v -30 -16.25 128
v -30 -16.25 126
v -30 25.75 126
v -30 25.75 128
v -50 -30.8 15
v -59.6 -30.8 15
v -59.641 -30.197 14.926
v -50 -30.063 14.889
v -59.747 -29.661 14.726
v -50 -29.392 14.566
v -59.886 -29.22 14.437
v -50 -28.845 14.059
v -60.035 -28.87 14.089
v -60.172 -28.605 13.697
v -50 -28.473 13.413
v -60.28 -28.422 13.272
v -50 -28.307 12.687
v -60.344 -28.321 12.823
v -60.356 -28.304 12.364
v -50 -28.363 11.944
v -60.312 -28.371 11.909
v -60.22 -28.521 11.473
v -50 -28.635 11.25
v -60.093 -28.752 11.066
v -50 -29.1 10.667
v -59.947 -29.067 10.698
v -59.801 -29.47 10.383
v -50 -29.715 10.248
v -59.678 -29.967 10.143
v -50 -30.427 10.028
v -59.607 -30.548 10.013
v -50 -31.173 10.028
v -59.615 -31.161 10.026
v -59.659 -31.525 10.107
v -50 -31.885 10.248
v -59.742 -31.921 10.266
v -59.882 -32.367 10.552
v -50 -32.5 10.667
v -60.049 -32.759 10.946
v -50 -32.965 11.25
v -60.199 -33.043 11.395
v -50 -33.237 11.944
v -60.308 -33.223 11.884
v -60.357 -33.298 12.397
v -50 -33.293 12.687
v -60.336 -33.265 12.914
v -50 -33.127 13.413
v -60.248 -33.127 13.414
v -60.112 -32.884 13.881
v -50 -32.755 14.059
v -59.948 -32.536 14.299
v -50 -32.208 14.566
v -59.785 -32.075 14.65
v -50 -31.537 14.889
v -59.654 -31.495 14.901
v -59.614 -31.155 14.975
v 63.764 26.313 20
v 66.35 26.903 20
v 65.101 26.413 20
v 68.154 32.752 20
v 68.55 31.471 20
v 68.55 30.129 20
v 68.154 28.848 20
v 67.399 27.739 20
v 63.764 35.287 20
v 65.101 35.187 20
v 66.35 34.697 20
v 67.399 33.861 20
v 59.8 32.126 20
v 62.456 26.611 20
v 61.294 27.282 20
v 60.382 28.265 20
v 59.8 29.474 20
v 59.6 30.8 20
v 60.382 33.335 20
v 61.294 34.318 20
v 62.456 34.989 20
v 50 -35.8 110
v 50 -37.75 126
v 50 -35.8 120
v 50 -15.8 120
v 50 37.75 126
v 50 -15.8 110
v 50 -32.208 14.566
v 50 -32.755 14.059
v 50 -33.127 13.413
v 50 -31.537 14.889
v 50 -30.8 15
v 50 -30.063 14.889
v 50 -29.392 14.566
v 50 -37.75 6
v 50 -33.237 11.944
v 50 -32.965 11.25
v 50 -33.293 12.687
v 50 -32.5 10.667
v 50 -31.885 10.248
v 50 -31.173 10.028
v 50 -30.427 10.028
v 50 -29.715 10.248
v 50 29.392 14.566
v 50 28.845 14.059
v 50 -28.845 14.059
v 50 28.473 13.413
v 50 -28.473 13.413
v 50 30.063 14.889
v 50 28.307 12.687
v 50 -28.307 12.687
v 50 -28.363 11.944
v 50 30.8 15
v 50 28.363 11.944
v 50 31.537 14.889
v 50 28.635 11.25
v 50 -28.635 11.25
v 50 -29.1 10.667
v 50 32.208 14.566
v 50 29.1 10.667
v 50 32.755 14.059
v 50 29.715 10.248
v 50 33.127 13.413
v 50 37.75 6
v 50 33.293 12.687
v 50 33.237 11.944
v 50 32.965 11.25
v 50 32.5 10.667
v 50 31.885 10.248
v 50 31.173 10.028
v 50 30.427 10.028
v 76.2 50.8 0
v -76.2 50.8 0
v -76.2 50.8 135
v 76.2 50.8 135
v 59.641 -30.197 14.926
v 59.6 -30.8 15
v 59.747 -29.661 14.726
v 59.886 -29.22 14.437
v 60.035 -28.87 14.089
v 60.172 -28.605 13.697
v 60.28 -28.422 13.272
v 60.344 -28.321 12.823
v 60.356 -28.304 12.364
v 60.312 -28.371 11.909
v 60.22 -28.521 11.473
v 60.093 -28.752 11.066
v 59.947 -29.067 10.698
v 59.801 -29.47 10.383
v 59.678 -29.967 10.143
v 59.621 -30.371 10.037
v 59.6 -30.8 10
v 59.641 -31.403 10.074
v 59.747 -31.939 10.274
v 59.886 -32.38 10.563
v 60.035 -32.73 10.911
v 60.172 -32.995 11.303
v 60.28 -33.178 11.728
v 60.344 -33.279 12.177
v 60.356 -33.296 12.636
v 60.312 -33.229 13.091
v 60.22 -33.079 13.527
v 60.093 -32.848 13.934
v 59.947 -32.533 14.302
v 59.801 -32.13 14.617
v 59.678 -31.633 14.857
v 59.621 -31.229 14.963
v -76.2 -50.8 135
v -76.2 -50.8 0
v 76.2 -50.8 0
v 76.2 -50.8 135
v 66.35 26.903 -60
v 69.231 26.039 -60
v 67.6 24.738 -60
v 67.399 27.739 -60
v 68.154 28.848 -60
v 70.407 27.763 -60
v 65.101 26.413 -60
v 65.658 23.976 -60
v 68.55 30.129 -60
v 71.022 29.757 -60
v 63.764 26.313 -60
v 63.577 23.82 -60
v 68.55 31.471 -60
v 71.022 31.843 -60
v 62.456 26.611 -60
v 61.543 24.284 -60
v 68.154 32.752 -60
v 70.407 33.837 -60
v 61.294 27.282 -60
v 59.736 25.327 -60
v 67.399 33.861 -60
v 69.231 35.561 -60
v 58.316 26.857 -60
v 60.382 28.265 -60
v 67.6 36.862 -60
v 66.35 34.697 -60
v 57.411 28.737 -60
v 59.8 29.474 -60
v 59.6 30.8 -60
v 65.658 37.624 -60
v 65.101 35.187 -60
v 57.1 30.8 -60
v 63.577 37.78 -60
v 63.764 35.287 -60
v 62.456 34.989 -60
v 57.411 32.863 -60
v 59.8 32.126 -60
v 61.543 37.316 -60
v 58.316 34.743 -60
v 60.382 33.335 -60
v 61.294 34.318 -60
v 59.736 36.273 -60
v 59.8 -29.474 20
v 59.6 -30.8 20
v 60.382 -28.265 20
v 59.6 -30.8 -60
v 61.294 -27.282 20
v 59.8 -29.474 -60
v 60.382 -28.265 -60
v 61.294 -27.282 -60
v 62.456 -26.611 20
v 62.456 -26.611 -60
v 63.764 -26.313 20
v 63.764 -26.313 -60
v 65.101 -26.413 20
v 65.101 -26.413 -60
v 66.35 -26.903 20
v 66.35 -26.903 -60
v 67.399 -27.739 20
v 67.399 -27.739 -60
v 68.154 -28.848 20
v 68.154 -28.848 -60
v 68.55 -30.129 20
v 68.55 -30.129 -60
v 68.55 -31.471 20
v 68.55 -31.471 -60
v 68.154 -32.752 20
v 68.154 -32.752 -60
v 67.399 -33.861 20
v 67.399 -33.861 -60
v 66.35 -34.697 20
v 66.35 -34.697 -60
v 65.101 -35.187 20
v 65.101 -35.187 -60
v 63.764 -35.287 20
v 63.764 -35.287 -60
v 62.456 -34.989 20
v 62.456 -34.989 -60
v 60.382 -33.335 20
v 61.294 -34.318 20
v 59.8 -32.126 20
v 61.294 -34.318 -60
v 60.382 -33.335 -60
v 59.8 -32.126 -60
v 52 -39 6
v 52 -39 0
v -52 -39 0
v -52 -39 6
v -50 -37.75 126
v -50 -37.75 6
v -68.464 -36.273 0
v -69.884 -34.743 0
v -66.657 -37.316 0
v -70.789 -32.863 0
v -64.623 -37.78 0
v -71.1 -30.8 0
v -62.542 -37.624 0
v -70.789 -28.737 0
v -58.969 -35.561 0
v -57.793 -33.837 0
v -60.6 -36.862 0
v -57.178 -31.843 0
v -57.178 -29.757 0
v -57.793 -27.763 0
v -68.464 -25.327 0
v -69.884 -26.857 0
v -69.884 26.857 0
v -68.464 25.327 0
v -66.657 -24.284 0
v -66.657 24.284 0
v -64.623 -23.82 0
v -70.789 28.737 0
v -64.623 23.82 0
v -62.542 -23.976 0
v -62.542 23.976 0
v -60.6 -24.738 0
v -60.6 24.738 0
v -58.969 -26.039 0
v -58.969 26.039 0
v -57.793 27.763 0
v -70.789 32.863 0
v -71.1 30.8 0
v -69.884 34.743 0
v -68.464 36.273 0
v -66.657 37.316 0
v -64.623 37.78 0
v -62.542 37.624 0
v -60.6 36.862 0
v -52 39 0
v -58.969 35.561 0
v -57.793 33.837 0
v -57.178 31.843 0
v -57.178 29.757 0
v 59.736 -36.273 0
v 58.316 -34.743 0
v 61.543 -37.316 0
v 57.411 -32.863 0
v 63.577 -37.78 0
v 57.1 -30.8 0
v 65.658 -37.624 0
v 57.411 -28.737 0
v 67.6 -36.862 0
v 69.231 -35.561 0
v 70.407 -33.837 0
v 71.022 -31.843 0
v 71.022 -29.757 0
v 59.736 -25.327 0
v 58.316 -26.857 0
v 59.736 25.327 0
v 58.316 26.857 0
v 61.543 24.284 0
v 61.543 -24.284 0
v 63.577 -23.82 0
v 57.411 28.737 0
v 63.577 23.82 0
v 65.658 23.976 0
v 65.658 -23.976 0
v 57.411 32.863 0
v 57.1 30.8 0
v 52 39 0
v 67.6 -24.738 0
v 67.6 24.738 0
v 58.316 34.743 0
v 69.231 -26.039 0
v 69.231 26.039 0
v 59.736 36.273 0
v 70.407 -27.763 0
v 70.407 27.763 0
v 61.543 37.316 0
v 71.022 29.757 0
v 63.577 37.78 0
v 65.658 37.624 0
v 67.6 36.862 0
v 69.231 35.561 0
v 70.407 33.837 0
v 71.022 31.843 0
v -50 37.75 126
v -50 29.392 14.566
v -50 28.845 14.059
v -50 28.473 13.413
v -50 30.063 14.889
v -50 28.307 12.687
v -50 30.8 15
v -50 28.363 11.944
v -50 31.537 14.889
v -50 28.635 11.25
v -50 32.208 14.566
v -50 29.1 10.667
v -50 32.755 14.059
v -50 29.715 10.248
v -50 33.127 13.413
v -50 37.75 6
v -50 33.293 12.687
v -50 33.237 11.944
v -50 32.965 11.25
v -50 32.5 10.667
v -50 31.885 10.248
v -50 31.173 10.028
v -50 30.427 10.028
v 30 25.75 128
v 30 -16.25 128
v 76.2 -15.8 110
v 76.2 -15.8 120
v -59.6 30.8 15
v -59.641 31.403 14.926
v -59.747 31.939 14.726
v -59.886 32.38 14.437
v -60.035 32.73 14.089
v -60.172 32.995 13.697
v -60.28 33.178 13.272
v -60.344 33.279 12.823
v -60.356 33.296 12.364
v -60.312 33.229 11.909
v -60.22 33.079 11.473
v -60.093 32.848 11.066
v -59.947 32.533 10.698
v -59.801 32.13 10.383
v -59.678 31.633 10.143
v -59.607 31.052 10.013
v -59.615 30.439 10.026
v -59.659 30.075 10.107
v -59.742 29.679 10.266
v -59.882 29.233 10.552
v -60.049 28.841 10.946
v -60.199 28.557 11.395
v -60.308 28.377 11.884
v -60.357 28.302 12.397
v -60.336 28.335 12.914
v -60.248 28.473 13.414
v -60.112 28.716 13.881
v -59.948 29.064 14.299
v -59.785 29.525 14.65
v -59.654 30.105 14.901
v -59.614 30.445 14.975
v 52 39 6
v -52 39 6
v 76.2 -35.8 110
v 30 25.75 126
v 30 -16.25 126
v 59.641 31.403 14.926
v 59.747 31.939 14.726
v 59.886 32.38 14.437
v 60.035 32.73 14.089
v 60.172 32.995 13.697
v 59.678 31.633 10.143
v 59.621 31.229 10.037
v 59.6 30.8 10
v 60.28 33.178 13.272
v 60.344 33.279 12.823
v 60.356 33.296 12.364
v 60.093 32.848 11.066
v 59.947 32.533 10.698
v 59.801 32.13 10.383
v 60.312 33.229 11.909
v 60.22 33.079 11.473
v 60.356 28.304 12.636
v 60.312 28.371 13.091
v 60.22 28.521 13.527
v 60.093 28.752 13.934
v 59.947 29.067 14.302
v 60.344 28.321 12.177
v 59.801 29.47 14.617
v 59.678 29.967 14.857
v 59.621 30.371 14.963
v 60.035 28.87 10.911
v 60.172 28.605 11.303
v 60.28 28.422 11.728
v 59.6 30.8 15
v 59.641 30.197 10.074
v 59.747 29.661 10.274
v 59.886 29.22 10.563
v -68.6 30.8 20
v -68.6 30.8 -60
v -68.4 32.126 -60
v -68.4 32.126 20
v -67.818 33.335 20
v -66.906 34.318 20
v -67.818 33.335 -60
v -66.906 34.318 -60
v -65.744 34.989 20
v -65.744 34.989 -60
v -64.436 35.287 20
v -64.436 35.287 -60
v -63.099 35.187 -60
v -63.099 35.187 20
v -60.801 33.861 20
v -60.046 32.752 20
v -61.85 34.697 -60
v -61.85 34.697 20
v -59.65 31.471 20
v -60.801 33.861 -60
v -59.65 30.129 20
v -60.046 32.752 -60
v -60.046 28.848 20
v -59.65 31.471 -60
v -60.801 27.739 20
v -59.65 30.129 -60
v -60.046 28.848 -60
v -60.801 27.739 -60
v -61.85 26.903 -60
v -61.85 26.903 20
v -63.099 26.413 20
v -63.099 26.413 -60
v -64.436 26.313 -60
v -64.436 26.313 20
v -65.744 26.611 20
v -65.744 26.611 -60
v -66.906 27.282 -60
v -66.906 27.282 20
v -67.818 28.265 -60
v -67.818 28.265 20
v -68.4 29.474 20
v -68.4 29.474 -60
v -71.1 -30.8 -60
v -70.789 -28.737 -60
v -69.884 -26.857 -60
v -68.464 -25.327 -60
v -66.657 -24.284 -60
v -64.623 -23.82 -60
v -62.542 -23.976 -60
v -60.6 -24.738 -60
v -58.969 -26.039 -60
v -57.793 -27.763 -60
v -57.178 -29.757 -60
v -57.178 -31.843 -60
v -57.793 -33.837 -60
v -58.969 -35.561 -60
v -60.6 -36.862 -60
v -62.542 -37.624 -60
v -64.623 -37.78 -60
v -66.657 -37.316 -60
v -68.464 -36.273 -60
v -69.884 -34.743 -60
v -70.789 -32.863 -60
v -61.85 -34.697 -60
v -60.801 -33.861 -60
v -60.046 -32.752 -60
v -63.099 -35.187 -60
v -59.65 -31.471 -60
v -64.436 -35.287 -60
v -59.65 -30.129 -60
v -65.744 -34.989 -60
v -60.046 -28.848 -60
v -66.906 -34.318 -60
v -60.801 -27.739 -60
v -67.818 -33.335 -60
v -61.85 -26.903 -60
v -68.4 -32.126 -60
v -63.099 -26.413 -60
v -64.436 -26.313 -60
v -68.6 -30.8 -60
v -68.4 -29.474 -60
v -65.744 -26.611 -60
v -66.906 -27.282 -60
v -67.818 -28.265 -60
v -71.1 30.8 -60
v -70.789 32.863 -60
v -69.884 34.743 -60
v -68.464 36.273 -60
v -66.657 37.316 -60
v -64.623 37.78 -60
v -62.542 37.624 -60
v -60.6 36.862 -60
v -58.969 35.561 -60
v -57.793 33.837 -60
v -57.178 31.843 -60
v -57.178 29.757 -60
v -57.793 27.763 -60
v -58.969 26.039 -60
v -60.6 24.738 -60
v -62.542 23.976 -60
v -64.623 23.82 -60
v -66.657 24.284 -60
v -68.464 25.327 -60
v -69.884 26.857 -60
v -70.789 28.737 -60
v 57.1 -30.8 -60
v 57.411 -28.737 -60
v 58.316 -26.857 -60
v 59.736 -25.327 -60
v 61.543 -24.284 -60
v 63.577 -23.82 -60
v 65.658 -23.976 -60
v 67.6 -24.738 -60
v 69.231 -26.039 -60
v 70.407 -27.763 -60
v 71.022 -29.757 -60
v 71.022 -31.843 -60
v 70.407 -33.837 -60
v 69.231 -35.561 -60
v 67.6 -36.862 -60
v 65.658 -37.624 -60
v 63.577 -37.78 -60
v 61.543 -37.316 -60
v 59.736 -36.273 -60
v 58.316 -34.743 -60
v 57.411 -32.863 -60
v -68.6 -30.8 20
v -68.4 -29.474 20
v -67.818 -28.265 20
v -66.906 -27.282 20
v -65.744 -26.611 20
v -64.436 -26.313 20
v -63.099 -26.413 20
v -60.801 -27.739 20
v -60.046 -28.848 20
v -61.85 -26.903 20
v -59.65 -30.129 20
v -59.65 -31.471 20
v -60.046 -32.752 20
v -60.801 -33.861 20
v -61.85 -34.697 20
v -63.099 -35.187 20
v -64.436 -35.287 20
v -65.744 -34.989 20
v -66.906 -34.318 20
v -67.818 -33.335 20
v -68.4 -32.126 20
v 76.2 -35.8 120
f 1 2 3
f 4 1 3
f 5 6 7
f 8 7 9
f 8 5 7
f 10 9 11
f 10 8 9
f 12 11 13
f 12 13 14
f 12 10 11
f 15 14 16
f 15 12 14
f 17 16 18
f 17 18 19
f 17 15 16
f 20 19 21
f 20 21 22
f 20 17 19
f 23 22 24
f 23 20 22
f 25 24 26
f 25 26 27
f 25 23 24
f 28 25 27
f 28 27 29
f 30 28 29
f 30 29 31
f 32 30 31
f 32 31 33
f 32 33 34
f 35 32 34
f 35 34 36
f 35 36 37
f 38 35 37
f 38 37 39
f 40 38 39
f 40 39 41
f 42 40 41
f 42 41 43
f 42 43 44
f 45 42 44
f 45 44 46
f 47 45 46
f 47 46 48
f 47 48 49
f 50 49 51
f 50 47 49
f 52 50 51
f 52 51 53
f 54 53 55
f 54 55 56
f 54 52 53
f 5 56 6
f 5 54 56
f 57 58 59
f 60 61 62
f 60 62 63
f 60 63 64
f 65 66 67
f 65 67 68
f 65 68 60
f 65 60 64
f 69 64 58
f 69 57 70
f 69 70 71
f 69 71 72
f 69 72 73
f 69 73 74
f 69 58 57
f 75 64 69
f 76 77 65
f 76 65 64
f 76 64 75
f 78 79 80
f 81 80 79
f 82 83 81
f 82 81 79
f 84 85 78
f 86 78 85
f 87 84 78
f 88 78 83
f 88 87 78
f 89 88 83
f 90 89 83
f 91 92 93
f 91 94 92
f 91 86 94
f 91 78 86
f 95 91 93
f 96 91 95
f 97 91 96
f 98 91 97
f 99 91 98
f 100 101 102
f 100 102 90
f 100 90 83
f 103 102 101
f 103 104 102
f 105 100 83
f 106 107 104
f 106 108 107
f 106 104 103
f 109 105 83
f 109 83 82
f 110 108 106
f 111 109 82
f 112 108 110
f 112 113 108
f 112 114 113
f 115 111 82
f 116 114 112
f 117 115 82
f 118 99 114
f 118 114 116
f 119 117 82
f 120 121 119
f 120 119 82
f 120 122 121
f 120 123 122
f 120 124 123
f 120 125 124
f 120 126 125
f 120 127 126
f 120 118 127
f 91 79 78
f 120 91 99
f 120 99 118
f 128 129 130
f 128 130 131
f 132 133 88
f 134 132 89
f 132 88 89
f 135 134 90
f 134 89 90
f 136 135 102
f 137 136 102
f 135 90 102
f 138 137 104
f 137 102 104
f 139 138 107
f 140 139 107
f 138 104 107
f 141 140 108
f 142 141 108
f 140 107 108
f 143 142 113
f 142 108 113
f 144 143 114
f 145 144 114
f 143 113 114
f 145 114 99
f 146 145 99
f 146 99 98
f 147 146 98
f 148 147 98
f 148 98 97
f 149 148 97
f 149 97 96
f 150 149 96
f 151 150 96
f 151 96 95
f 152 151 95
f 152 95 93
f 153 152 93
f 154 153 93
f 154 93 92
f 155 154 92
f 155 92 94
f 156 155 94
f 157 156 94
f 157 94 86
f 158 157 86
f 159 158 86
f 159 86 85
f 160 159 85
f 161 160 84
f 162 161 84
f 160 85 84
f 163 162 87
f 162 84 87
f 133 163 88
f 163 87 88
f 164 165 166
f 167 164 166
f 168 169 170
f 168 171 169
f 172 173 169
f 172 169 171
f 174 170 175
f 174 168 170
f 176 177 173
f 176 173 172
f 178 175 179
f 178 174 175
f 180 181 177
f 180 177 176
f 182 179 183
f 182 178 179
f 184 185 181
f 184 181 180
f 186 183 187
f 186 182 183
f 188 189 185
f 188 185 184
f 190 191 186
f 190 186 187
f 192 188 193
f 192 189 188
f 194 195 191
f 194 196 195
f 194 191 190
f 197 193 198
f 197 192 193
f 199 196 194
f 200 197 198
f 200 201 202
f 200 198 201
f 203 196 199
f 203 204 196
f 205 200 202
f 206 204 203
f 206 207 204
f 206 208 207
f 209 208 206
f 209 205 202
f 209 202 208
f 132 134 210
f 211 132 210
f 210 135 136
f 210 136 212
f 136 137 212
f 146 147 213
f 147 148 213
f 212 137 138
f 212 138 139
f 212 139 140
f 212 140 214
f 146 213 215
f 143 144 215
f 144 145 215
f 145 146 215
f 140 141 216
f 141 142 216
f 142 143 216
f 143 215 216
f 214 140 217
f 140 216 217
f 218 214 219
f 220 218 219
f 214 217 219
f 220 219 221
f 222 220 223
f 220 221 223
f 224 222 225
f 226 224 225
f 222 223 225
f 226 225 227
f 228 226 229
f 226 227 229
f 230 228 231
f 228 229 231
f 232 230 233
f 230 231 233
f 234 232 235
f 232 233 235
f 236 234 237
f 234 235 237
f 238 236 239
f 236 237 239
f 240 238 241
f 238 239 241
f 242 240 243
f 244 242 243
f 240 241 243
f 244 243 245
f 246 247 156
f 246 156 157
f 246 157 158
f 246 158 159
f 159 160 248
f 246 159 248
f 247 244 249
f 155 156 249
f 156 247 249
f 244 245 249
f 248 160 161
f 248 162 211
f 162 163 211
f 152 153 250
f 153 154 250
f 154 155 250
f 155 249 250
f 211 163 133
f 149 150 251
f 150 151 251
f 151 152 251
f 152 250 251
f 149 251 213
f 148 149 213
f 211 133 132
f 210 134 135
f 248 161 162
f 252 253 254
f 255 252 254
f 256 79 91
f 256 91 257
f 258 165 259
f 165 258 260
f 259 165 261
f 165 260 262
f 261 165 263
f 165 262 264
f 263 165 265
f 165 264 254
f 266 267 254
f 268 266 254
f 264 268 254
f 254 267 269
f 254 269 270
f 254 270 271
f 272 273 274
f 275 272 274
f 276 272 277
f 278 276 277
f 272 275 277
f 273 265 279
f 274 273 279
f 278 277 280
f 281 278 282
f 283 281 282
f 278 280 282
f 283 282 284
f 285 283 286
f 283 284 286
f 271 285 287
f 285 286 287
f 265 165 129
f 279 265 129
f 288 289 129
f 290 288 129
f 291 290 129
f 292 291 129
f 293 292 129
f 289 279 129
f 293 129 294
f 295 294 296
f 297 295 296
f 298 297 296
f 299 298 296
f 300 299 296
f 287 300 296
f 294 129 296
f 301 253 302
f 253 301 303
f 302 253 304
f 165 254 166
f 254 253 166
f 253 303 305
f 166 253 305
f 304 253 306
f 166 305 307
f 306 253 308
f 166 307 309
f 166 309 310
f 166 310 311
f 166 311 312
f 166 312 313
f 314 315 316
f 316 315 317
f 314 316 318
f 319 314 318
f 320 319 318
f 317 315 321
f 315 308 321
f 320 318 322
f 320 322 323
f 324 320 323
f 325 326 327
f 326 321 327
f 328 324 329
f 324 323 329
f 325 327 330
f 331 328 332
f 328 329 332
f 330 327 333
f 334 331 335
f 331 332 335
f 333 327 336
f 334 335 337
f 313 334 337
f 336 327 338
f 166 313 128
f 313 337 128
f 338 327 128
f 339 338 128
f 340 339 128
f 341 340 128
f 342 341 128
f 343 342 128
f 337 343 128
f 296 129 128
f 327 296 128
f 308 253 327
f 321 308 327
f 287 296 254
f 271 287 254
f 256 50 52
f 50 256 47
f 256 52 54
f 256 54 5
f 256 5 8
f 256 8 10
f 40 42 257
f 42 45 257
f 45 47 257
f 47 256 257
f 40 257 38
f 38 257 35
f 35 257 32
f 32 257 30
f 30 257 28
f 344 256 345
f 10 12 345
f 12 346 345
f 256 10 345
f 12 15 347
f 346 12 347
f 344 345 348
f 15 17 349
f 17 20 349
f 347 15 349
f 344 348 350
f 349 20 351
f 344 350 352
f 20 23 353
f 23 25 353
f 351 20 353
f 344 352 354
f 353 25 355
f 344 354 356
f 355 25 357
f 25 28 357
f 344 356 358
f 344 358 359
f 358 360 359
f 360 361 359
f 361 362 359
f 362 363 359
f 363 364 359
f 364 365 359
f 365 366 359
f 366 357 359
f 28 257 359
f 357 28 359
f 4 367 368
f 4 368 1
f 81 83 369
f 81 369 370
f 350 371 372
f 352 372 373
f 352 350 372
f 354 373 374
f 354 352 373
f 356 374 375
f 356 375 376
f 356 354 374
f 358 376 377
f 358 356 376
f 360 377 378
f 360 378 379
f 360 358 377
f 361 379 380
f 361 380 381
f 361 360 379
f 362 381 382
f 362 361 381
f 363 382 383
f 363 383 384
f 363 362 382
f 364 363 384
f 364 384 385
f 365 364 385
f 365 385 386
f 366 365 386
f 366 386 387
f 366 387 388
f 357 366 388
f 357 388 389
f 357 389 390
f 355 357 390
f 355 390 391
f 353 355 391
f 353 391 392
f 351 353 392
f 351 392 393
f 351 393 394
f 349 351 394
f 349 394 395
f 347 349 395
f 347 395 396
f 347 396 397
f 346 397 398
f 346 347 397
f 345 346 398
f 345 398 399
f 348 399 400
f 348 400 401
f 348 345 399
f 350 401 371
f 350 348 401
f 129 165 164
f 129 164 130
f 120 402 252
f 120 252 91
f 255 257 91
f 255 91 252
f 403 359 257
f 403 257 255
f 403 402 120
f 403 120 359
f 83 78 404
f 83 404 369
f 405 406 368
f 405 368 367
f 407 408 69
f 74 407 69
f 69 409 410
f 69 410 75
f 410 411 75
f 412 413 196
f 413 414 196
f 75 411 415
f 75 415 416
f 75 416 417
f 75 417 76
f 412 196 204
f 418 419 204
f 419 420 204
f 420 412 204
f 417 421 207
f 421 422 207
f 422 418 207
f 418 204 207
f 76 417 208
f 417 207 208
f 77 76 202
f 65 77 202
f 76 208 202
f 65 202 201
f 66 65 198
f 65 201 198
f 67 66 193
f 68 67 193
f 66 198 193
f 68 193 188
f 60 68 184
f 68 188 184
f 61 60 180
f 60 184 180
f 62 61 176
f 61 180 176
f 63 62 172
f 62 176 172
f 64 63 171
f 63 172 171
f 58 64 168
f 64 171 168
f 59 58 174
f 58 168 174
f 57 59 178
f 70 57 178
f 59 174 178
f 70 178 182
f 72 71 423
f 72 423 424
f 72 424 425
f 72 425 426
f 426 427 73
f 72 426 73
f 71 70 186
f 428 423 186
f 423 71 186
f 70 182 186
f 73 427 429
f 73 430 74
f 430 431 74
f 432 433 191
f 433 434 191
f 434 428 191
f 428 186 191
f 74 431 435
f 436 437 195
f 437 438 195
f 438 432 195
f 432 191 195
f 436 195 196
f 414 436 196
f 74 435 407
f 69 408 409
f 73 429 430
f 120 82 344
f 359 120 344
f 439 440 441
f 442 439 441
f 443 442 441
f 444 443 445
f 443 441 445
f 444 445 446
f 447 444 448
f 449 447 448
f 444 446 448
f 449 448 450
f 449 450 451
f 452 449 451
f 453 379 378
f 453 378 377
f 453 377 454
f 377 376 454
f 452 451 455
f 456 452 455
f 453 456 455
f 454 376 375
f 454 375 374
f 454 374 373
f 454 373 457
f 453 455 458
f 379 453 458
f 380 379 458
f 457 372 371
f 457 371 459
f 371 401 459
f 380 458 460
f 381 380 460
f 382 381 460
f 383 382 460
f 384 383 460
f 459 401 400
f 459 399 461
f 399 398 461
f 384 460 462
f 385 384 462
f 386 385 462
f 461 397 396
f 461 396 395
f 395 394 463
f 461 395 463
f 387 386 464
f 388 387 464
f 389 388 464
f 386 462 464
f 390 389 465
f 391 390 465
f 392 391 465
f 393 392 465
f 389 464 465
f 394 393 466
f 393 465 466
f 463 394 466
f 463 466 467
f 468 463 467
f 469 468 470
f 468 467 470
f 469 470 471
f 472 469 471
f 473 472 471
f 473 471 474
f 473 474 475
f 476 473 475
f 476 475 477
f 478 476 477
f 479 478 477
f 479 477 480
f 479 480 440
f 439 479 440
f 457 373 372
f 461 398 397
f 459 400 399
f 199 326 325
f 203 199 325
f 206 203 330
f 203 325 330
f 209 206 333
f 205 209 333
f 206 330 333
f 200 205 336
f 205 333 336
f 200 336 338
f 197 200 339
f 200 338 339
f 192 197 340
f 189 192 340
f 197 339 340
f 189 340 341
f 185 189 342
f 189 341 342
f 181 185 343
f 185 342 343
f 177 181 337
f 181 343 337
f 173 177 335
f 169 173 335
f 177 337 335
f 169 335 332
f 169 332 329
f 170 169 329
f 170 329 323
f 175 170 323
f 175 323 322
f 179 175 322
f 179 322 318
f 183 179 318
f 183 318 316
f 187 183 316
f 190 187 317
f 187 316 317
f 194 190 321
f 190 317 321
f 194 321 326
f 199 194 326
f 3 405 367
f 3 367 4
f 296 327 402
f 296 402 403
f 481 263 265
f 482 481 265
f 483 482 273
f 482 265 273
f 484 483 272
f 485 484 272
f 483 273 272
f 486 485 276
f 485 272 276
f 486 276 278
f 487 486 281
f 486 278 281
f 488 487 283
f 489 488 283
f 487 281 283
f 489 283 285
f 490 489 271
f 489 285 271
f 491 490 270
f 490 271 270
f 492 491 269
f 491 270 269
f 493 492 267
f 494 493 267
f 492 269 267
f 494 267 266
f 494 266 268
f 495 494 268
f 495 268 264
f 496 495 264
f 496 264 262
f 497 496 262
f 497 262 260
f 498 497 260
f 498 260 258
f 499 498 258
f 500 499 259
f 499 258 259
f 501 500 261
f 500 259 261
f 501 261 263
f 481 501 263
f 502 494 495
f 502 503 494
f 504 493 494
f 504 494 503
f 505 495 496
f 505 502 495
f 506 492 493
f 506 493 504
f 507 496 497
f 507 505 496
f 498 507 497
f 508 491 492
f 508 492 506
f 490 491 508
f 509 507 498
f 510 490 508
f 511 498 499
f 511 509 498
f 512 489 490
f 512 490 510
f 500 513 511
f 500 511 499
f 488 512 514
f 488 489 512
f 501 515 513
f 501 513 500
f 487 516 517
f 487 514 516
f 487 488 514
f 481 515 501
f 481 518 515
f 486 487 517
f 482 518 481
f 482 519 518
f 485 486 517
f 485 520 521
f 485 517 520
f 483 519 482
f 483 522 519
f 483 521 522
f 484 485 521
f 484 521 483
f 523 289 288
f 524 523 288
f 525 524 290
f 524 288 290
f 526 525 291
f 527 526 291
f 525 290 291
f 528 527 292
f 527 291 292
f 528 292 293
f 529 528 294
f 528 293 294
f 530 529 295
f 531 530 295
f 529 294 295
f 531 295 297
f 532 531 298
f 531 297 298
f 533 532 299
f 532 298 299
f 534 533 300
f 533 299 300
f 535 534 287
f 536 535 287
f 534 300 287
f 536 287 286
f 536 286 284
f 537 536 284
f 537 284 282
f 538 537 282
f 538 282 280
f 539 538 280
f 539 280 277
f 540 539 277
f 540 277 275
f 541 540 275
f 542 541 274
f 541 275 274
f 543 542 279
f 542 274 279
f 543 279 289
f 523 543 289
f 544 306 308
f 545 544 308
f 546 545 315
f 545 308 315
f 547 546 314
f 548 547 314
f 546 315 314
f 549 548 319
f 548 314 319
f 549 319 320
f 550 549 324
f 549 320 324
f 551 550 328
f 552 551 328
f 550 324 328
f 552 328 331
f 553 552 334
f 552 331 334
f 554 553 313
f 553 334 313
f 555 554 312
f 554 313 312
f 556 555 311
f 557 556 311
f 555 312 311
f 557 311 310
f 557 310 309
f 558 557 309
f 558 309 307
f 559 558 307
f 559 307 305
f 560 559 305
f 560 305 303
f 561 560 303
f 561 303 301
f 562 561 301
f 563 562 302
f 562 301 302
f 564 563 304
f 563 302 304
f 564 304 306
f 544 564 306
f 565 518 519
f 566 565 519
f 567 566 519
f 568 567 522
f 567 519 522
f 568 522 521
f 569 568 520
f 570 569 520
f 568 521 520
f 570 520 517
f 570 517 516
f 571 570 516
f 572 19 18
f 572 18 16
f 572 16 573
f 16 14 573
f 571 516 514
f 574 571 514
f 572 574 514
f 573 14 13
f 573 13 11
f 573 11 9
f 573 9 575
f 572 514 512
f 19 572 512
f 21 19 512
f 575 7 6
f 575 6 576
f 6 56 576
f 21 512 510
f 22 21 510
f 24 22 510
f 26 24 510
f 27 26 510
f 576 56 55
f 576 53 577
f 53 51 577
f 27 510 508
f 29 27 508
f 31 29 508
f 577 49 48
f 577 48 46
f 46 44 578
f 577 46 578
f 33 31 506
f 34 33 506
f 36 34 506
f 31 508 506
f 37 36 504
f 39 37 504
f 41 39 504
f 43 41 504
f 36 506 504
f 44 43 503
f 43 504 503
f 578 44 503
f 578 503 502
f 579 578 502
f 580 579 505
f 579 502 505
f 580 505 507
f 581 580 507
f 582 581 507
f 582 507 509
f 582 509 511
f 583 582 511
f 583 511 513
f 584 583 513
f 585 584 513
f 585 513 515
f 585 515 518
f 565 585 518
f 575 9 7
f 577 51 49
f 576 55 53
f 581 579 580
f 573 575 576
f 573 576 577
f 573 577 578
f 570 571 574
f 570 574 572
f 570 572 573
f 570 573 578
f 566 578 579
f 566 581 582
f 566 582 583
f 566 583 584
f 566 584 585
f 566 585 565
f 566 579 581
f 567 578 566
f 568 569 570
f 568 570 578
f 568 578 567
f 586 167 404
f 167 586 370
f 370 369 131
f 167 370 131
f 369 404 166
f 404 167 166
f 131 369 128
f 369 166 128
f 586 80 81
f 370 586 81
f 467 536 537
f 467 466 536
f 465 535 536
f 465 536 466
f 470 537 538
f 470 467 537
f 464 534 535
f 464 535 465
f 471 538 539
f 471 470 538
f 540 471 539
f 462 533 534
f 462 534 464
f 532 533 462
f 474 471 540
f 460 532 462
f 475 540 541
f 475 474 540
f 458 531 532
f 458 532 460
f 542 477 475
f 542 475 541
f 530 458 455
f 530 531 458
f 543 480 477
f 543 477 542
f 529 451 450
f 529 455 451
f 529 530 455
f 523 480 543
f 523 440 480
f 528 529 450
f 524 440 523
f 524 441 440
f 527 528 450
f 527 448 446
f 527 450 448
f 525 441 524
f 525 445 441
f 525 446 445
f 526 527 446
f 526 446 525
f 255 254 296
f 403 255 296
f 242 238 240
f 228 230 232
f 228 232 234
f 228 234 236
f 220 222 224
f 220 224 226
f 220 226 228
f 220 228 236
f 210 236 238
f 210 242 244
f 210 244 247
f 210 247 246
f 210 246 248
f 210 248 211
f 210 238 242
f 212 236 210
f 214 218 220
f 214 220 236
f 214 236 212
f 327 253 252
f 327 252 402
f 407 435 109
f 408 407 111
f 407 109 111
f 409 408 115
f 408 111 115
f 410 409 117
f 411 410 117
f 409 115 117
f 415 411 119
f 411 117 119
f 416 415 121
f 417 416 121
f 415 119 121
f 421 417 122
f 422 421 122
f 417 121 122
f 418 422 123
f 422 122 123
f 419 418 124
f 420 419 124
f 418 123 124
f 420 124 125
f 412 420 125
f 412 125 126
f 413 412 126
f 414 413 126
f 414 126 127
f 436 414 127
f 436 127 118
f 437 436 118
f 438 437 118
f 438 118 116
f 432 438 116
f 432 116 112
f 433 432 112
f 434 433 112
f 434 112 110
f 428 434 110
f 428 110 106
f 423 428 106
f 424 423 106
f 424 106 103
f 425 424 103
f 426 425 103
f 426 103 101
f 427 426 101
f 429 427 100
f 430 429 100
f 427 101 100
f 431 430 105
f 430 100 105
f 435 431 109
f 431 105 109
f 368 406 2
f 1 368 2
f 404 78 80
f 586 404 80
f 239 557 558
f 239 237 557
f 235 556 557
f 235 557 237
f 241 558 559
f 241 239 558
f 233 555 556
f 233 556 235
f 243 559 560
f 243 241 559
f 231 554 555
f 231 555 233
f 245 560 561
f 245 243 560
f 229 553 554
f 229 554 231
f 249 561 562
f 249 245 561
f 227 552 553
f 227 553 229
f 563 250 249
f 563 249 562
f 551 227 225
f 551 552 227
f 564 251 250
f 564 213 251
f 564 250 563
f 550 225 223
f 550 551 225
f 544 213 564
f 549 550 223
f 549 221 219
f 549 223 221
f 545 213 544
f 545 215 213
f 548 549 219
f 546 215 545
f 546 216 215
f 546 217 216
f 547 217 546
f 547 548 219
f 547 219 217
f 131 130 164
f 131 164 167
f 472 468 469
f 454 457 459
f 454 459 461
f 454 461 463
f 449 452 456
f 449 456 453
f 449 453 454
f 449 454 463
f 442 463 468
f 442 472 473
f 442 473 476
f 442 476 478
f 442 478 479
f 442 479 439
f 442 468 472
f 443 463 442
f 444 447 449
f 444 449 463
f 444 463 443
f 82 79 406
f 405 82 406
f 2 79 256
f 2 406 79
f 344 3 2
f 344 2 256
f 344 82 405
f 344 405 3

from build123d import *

# Parameters (mm, degrees)
SKETCH1_W           = 152.4
SKETCH1_H           = 101.6
BOSS_EXTRUDE1_DEPTH = 135
SKETCH2_W           = 104
SKETCH2_H           = 78
CUT_EXTRUDE1_DEPTH  = 6
SKETCH4_R           = 7
BOSS_EXTRUDE3_DEPTH = 60
SKETCH5_R           = 4.5
CUT_EXTRUDE3_DEPTH  = 80
SKETCH12_W          = 100
SKETCH12_H          = 75.5
CUT_EXTRUDE7_DEPTH  = 120
SKETCH13_W          = 60
SKETCH13_H          = 42
CUT_EXTRUDE8_DEPTH  = 2
SKETCH24_R          = 2.5
CUT_EXTRUDE9_DEPTH  = 15
SKETCH26_W          = 10
SKETCH26_H          = 20
CUT_EXTRUDE10_DEPTH = 27.2


with BuildPart() as part:
    # Sketch1 → Boss-Extrude1 (new body)
    with BuildSketch(Plane.XY):
        Rectangle(SKETCH1_W, SKETCH1_H)
    extrude(amount=BOSS_EXTRUDE1_DEPTH)

    # Sketch2 → Cut-Extrude1 (cut)
    with BuildSketch(Plane(origin=(0, 0, 0), x_dir=(-1, 0, 0), z_dir=(0, 0, -1))):
        Rectangle(SKETCH2_W, SKETCH2_H)
    extrude(amount=-CUT_EXTRUDE1_DEPTH, mode=Mode.SUBTRACT)

    # Sketch4 → Boss-Extrude3 (add)
    with BuildSketch(Plane(origin=(0, 0, 0), x_dir=(-1, 0, 0), z_dir=(0, 0, -1))):
        with Locations((-64.1, -30.8)):
            Circle(SKETCH4_R)
        with Locations((-64.1, 30.8)):
            Circle(SKETCH4_R)
        with Locations((64.1, 30.8)):
            Circle(SKETCH4_R)
        with Locations((64.1, -30.8)):
            Circle(SKETCH4_R)
    extrude(amount=BOSS_EXTRUDE3_DEPTH)

    # Sketch5 → Cut-Extrude3 (cut)
    with BuildSketch(Plane(origin=(0, 0, -60), x_dir=(-1, 0, 0), z_dir=(0, 0, -1))):
        with Locations((-64.1, 30.8)):
            Circle(SKETCH5_R)
        with Locations((64.1, 30.8)):
            Circle(SKETCH5_R)
        with Locations((64.1, -30.8)):
            Circle(SKETCH5_R)
        with Locations((-64.1, -30.8)):
            Circle(SKETCH5_R)
    extrude(amount=-CUT_EXTRUDE3_DEPTH, mode=Mode.SUBTRACT)

    # Sketch12 → Cut-Extrude7 (cut)
    with BuildSketch(Plane(origin=(0, 0, 6), x_dir=(-1, 0, 0), z_dir=(0, 0, -1))):
        Rectangle(SKETCH12_W, SKETCH12_H)
    extrude(amount=-CUT_EXTRUDE7_DEPTH, mode=Mode.SUBTRACT)

    # Sketch13 → Cut-Extrude8 (cut)
    with BuildSketch(Plane(origin=(0, 0, 126), x_dir=(-1, 0, 0), z_dir=(0, 0, -1))):
        with Locations((0, 4.75)):
            Rectangle(SKETCH13_W, SKETCH13_H)
    extrude(amount=-CUT_EXTRUDE8_DEPTH, mode=Mode.SUBTRACT)

    # Sketch24 → Cut-Extrude9 (cut)
    with BuildSketch(Plane.ZY.offset(-50)):
        with Locations((12.5, 30.8)):
            Circle(SKETCH24_R)
        with Locations((12.5, -30.8)):
            Circle(SKETCH24_R)
    cut_extrude9 = extrude(amount=-CUT_EXTRUDE9_DEPTH, mode=Mode.SUBTRACT)

    # Mirror2: Cut-Extrude9 across plane
    add(cut_extrude9.mirror(Plane(origin=(0, 0, 0), x_dir=(0, 0, 1), z_dir=(1, 0, 0))), mode=Mode.SUBTRACT)

    # Sketch26 → Cut-Extrude10 (cut, through all)
    with BuildSketch(Plane.ZY.offset(-50)):
        with Locations((115, -25.8)):
            Rectangle(SKETCH26_W, SKETCH26_H)
    extrude(amount=-CUT_EXTRUDE10_DEPTH, mode=Mode.SUBTRACT)


solid = part.part
